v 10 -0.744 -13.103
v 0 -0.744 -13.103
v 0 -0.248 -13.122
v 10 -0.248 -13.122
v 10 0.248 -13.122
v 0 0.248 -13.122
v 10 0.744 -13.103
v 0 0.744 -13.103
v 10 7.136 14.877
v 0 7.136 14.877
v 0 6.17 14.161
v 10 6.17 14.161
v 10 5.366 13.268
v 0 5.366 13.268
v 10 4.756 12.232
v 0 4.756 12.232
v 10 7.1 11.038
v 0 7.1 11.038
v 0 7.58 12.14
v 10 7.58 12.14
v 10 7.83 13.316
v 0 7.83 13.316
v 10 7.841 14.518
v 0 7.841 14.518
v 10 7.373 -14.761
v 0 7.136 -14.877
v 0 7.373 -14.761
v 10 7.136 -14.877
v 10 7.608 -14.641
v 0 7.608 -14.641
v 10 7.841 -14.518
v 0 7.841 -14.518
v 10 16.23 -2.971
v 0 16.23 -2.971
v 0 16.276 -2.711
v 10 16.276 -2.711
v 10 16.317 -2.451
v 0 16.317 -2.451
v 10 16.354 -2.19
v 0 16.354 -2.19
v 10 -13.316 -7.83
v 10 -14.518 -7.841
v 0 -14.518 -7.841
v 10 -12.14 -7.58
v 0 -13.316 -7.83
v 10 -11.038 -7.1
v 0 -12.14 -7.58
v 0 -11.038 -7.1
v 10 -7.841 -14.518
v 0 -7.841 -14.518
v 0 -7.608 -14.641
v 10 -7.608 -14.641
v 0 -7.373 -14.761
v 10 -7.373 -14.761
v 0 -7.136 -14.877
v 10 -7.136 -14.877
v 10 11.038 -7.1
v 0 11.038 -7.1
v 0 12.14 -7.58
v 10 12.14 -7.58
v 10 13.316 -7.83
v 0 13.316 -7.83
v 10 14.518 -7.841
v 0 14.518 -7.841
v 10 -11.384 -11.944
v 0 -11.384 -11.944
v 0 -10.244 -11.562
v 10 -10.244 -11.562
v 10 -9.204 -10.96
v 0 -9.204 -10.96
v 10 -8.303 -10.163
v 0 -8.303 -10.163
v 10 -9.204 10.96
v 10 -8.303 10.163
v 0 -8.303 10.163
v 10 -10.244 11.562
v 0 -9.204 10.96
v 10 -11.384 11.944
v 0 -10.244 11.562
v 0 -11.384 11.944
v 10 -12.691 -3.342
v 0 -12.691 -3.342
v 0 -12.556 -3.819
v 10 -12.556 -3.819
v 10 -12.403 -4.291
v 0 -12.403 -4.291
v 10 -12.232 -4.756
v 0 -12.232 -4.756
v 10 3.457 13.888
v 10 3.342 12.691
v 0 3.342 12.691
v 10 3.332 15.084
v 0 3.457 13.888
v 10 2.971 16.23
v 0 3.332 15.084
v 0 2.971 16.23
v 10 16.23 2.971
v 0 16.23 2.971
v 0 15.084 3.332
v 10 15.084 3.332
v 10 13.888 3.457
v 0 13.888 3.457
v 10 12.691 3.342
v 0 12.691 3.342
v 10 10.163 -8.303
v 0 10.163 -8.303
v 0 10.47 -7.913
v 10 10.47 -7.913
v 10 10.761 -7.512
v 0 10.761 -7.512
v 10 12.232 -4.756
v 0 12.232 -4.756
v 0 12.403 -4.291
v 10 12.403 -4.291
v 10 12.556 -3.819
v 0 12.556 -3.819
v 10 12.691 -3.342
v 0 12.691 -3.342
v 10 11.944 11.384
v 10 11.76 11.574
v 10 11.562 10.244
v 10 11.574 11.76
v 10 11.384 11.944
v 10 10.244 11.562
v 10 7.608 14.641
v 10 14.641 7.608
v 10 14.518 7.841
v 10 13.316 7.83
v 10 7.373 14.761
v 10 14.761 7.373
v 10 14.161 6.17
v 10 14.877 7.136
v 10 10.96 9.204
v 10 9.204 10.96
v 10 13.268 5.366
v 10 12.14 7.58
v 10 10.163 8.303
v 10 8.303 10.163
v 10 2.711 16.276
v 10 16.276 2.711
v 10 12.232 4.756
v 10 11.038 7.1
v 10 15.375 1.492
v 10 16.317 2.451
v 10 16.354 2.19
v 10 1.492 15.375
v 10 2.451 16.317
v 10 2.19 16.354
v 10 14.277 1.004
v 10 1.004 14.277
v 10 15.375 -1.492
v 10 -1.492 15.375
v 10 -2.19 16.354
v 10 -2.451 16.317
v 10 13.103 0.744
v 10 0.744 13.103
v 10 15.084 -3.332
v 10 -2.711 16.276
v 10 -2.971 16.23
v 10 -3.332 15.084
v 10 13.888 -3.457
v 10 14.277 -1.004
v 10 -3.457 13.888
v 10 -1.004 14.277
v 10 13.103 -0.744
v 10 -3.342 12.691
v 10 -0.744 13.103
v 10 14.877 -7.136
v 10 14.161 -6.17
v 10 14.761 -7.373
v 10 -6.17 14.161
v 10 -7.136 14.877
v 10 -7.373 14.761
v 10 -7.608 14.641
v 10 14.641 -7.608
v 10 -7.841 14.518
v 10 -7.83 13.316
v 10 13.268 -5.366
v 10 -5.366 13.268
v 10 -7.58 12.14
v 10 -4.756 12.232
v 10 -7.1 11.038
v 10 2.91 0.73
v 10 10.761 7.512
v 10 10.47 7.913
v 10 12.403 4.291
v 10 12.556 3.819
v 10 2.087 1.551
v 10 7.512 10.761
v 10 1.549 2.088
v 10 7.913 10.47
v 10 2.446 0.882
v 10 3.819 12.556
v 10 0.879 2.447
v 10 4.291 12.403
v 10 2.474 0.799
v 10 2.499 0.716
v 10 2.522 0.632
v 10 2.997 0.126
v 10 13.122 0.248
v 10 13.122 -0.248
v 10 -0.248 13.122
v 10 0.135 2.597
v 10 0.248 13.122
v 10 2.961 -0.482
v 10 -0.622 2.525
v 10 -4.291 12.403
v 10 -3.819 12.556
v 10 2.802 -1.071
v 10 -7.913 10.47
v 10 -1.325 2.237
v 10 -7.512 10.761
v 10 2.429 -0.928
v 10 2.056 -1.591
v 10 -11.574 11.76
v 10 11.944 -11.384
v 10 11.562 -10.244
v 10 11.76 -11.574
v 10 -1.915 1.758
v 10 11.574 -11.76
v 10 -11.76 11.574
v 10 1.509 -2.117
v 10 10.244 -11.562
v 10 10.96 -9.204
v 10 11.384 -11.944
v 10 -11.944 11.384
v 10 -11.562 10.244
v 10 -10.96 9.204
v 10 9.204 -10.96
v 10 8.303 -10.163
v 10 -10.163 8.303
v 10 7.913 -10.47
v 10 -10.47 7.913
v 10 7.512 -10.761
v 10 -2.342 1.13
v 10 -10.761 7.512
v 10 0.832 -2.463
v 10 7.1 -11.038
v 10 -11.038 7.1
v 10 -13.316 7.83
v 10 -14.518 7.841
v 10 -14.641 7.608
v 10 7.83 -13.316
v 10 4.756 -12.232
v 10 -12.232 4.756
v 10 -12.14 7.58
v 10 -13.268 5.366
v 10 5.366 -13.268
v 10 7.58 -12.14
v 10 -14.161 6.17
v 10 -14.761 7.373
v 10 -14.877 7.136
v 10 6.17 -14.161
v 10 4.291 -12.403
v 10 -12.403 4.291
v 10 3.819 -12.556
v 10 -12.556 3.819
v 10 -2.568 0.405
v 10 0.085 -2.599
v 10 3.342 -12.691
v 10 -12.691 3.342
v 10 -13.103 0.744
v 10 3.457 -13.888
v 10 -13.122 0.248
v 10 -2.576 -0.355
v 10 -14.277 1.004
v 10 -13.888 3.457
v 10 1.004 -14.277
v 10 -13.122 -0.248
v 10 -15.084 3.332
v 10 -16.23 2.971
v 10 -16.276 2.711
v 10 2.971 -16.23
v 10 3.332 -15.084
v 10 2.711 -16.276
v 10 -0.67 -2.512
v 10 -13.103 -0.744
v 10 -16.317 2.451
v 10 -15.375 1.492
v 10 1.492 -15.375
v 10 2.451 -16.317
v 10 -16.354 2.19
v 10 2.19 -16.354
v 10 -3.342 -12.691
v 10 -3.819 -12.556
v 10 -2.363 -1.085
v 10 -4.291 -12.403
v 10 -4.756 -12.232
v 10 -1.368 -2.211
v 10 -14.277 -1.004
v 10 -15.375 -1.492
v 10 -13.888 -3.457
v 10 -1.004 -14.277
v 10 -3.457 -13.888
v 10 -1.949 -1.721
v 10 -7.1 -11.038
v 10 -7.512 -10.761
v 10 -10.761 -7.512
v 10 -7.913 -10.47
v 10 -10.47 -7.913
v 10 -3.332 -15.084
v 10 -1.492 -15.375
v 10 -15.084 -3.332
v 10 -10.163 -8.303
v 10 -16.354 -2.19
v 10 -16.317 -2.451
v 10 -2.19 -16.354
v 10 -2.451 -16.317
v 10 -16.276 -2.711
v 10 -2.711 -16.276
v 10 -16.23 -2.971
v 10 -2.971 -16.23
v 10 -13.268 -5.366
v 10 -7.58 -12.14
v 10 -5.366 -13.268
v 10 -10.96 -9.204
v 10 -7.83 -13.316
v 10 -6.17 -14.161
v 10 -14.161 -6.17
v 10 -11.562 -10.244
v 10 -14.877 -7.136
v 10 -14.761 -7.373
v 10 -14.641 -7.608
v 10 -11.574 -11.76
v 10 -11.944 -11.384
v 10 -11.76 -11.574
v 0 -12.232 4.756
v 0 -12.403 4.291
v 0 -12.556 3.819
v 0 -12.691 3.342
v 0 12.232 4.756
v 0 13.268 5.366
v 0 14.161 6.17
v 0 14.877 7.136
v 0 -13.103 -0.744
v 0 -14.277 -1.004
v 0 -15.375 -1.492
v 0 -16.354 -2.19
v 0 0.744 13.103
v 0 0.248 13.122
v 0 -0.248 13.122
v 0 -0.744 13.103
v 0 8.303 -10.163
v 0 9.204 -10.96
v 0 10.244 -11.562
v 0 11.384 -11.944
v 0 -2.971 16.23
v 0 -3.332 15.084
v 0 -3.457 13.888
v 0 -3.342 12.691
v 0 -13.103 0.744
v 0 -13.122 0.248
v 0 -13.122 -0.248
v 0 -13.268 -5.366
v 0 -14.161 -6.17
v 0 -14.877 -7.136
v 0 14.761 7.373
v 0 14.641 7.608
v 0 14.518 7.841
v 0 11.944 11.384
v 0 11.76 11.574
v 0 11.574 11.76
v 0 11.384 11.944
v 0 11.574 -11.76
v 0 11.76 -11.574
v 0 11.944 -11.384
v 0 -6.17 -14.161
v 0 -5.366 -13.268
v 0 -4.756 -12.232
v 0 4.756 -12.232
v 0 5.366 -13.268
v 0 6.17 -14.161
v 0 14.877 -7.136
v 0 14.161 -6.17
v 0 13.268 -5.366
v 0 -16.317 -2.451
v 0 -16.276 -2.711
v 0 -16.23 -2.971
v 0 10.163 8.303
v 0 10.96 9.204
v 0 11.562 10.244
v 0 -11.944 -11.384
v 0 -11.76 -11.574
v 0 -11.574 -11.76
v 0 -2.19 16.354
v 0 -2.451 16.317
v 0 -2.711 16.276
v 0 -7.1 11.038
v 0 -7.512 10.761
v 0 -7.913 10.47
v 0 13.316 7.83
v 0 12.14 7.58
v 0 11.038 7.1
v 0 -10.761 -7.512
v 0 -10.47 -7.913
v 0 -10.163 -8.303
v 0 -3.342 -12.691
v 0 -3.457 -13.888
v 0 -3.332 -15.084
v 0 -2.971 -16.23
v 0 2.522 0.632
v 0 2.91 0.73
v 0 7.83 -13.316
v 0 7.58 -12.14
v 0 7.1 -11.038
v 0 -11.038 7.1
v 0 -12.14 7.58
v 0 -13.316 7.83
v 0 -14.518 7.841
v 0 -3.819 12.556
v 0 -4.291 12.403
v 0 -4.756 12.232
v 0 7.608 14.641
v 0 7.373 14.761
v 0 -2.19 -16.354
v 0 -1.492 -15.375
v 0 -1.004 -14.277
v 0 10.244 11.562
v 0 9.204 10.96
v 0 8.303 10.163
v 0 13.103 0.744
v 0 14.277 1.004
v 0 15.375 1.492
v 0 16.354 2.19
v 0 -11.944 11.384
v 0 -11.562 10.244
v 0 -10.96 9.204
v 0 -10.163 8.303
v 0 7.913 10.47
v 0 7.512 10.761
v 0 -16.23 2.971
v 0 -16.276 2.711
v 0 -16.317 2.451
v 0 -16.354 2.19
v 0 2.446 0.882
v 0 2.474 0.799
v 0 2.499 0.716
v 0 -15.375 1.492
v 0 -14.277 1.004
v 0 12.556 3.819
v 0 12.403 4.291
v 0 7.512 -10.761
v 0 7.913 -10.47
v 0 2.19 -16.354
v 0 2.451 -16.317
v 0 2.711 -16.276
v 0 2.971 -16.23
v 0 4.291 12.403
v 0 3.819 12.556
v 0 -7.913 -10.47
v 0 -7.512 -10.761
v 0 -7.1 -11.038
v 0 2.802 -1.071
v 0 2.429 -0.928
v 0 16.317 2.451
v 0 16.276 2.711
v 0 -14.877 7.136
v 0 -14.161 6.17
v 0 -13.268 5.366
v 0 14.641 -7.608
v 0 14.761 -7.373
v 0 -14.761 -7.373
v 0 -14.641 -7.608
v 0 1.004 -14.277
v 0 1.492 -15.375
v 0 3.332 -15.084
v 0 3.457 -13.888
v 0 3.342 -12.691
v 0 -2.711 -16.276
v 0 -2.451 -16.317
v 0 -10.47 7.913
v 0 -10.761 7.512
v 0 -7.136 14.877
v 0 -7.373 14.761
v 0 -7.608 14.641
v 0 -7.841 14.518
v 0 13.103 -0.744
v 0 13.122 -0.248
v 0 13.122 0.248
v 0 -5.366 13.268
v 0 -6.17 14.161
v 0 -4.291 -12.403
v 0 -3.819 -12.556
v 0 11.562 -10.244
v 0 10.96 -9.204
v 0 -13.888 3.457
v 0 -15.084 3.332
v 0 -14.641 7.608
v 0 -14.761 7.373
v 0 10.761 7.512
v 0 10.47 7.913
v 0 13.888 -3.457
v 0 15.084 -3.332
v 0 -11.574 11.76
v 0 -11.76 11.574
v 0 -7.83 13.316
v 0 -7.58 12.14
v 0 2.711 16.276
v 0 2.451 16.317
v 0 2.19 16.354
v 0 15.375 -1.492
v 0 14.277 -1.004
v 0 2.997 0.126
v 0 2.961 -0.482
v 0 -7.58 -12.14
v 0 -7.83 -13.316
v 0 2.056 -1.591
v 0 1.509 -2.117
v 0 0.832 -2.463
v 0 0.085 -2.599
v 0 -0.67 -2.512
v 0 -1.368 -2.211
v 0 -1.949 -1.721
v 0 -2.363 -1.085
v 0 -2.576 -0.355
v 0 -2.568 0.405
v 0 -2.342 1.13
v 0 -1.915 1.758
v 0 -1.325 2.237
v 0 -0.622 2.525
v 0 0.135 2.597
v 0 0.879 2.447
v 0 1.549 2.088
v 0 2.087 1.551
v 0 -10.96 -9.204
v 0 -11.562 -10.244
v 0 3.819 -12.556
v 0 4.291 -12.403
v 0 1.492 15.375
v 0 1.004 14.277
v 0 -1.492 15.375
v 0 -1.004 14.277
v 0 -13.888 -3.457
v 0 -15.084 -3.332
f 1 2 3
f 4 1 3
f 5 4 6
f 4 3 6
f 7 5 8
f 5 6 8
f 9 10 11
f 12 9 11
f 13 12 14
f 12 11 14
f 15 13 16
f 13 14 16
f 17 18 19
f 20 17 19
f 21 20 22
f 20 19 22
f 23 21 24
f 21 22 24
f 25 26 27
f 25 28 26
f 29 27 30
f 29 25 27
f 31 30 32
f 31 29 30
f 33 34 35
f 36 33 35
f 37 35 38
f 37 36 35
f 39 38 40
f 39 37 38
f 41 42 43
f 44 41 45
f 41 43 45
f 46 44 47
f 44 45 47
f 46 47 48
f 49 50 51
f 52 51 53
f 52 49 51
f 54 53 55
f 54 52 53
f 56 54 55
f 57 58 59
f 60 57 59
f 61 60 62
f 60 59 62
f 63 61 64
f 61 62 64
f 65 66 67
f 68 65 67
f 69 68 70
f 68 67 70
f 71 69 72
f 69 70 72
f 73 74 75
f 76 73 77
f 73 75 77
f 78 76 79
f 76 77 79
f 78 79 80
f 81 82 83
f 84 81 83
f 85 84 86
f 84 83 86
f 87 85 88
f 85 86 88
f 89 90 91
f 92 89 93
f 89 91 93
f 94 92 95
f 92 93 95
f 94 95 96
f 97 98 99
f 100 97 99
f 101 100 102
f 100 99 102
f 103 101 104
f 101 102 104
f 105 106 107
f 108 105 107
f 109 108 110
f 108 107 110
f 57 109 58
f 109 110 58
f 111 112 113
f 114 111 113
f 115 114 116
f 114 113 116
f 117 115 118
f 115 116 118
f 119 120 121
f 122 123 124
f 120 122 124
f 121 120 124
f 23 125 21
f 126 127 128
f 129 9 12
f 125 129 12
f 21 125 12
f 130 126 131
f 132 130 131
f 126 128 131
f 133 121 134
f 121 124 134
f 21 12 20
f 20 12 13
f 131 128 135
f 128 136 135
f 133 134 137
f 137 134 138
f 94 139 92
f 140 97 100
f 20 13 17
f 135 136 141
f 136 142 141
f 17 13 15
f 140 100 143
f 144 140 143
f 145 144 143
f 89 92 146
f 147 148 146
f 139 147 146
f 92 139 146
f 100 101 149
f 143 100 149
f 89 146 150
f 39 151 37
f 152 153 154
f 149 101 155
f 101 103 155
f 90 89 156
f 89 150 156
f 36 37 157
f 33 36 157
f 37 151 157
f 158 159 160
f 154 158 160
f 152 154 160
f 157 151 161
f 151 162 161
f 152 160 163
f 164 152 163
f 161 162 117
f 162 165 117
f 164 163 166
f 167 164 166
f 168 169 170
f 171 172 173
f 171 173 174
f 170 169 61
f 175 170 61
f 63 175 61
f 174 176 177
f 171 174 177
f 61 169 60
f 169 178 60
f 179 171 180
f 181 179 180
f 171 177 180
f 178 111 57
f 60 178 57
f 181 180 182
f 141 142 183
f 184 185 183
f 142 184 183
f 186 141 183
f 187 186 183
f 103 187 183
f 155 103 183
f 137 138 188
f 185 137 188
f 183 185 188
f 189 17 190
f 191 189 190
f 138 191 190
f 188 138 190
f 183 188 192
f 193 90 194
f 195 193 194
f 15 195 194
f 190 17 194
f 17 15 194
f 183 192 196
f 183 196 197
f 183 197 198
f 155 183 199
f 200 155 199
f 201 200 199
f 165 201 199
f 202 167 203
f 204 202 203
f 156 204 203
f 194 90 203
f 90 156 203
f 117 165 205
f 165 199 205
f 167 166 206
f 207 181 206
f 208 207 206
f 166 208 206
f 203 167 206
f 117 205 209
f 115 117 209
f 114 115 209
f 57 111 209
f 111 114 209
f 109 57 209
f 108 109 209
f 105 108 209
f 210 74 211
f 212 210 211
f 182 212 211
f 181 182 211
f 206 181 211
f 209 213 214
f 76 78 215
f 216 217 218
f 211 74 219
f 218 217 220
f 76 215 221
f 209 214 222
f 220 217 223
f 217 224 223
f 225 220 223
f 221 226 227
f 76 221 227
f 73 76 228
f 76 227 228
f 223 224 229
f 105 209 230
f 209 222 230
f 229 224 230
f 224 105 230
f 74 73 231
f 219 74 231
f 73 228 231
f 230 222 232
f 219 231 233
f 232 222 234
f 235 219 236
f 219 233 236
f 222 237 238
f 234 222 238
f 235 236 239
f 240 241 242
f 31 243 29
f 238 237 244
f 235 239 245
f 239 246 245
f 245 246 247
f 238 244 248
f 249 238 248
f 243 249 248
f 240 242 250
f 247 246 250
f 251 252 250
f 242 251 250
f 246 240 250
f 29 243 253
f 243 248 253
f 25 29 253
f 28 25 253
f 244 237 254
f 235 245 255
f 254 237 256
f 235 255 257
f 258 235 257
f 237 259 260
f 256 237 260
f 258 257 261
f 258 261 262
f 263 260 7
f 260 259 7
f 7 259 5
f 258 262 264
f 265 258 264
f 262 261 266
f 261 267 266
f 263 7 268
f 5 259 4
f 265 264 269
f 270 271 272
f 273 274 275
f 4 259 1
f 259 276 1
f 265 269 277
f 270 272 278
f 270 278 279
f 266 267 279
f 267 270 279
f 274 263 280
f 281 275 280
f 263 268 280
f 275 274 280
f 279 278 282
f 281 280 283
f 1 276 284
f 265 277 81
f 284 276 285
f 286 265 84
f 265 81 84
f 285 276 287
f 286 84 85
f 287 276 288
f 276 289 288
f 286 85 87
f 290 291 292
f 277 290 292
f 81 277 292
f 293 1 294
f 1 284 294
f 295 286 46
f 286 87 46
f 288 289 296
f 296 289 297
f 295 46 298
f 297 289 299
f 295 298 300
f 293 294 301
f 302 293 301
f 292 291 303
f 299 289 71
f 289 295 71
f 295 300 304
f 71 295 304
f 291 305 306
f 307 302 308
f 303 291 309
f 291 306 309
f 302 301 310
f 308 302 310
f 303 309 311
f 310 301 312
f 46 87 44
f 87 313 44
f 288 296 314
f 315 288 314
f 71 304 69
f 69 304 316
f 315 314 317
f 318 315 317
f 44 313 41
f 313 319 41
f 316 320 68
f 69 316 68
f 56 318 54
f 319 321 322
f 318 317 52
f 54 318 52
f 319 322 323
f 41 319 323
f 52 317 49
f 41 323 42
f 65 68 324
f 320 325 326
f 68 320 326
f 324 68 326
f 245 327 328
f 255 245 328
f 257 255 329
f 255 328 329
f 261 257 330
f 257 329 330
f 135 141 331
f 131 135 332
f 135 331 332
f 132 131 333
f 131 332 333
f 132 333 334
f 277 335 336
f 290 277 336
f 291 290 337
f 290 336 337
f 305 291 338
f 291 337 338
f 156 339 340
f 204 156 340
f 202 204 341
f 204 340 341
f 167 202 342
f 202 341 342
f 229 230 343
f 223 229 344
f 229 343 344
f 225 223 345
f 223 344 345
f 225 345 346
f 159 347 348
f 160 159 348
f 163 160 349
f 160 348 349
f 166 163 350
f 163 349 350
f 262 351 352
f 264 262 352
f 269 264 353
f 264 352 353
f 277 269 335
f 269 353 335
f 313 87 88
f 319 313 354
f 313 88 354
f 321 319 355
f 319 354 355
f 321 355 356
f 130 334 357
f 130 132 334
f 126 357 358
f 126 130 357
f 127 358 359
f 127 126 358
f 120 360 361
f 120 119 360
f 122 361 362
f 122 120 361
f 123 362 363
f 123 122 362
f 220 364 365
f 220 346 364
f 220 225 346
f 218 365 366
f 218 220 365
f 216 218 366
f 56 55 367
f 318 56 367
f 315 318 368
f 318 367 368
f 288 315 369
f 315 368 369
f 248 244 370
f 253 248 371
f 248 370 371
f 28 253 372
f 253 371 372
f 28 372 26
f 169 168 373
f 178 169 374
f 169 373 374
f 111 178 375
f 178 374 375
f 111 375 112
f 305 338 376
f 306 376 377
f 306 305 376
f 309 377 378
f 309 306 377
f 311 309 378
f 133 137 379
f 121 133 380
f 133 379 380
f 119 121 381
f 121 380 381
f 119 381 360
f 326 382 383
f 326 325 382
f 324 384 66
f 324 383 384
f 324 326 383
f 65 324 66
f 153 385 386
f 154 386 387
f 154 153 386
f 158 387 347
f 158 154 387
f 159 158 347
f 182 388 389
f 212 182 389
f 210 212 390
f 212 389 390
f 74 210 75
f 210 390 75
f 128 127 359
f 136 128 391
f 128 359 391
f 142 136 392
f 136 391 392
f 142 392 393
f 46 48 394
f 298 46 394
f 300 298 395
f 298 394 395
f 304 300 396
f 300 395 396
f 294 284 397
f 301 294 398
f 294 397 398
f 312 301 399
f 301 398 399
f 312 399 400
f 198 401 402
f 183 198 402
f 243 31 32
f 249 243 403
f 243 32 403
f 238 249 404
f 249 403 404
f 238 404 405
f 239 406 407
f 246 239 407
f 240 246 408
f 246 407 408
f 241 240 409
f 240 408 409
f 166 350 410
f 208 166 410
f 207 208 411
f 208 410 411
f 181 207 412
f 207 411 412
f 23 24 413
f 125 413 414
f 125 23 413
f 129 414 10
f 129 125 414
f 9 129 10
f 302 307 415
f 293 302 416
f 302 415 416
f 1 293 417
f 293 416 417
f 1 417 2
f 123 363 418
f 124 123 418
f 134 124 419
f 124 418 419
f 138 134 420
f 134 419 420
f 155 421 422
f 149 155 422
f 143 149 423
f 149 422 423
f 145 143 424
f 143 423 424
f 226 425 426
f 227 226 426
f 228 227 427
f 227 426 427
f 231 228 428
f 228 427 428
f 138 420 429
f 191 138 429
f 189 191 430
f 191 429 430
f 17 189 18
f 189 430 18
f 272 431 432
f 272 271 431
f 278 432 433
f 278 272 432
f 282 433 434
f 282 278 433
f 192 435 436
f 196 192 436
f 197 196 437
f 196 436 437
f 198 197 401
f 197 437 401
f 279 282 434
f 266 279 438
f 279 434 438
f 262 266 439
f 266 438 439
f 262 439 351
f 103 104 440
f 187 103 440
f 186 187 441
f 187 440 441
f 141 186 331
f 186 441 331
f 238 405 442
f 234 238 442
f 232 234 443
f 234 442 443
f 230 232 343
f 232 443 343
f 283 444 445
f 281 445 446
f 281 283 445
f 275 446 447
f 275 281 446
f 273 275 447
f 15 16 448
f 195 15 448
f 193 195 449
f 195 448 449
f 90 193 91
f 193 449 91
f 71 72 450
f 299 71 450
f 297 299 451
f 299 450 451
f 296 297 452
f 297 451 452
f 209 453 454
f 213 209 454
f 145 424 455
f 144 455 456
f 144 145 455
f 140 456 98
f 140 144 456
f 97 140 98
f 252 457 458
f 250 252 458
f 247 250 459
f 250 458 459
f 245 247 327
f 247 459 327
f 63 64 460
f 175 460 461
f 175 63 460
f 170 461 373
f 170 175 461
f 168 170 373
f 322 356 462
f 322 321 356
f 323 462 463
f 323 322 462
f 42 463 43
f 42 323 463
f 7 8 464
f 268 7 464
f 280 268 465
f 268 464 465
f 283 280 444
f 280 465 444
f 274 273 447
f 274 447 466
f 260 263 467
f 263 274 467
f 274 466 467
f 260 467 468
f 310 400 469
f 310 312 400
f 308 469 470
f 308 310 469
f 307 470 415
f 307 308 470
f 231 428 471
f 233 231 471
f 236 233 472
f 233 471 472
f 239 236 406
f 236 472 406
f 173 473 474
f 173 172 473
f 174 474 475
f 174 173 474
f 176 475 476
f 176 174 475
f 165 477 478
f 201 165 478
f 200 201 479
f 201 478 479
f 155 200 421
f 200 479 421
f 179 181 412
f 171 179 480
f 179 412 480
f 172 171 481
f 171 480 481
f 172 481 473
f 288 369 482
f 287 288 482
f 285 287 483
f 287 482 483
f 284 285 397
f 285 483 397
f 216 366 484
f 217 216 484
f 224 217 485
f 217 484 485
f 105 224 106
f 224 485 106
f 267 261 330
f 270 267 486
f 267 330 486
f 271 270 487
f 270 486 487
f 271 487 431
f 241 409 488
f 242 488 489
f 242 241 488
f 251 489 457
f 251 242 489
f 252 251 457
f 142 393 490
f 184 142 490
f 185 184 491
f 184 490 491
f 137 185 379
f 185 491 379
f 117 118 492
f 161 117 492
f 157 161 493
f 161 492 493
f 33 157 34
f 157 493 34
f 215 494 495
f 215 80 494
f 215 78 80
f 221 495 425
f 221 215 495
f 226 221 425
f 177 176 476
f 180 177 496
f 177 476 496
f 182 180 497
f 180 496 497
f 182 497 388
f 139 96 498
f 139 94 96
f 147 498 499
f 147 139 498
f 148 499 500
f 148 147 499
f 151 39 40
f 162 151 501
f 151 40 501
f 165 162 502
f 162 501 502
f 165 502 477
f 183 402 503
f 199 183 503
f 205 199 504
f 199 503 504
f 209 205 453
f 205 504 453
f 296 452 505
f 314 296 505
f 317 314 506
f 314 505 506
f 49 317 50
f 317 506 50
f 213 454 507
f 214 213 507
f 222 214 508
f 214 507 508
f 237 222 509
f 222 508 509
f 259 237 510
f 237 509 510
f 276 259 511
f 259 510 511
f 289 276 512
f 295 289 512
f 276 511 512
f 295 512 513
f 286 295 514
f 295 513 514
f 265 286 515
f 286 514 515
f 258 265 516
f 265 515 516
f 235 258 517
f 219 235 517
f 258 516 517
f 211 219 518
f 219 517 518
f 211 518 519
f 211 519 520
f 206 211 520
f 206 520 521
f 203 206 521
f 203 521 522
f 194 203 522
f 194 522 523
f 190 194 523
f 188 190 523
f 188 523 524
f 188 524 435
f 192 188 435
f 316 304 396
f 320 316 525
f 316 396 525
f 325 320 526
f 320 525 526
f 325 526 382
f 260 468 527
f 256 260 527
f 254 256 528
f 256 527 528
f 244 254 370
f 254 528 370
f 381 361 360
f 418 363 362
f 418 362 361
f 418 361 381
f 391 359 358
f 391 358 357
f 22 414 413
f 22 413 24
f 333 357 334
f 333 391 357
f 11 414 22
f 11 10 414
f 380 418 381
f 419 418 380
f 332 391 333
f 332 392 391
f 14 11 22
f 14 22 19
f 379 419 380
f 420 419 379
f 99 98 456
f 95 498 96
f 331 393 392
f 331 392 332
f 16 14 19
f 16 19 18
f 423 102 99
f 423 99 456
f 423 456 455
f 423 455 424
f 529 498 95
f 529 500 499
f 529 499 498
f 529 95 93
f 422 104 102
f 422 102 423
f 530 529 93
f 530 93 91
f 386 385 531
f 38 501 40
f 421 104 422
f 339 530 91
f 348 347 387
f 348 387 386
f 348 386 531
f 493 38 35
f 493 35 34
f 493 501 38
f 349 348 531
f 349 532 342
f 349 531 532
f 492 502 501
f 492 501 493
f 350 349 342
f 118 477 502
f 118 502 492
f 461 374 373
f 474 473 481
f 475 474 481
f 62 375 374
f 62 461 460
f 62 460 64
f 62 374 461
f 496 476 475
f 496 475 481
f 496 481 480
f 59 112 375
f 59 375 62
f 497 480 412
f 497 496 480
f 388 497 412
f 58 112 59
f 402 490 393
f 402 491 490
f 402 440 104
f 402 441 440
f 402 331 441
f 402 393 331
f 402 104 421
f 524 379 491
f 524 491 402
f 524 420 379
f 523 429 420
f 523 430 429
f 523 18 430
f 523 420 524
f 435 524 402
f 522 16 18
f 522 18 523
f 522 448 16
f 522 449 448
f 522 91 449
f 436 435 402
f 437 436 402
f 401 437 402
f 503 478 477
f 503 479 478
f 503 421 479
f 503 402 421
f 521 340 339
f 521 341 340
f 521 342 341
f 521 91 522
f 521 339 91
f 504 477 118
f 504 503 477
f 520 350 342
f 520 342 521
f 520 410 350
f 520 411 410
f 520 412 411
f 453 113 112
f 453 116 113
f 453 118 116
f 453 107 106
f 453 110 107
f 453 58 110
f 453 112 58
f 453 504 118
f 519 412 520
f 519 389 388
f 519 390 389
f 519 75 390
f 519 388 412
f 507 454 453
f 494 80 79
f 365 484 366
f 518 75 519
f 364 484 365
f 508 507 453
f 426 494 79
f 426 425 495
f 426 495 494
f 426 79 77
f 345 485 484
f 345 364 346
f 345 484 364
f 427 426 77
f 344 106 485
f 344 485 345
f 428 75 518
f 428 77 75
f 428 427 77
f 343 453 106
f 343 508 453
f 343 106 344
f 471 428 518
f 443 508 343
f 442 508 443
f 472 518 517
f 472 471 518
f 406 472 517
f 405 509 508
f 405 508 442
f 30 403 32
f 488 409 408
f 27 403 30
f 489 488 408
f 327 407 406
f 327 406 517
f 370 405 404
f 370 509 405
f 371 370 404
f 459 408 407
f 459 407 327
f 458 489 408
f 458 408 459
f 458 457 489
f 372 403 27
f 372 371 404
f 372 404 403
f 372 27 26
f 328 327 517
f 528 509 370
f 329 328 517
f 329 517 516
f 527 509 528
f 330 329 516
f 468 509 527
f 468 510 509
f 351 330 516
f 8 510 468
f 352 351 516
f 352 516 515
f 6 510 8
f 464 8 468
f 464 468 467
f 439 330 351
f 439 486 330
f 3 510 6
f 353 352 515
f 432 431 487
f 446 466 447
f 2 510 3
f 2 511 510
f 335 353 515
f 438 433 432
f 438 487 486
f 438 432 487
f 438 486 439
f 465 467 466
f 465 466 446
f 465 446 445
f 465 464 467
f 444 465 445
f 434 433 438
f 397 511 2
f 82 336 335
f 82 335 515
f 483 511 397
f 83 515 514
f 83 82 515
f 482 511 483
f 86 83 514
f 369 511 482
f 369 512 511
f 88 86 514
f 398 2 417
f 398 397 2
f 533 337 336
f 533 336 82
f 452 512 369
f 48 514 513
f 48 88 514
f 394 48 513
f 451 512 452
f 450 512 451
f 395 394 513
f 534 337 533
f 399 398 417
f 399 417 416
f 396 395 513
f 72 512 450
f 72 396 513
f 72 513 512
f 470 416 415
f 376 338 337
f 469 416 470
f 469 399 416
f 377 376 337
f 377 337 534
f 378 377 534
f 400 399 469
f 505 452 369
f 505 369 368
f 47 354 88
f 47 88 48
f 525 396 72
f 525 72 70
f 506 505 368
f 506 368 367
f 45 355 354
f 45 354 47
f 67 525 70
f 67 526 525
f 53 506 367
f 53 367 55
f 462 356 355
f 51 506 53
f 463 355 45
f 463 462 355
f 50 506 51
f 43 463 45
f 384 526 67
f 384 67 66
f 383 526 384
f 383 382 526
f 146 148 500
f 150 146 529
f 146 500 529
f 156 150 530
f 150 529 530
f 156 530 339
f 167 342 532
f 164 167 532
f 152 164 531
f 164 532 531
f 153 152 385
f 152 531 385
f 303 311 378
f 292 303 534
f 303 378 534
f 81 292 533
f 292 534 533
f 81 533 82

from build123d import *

# Parameters (mm, degrees)
BASPROSKE_W        = 10
BASPROSKE_H        = 16.5
TOOTHCUT_DEPTH     = 26.38700455
TEETHCUTS_COUNT    = 20
TEETHCUTS_ANGLE    = 342
BORSKE_R           = 2.5
BORE_DEPTH         = 50.0000508
CUT_EXTRUDE1_DEPTH = 26.197414545


with BuildPart() as part:
    # BasProSke → Base-Revolve (revolve)
    with BuildSketch(Plane(origin=(0, 0, 0), x_dir=(1, 0, 0), z_dir=(0, 1, 0)), mode=Mode.PRIVATE) as base_revolve_sk:
        with Locations((5, 8.25)):
            Rectangle(BASPROSKE_W, BASPROSKE_H)
    revolve(base_revolve_sk.sketch.rotate(Axis((-10, 0, 0), (1, 0, 0)), 180), axis=Axis((-10, 0, 0), (1, 0, 0)))

    # TooCutSke → ToothCut (cut, through all)
    with BuildSketch(Plane(origin=(0, 0, 0), x_dir=(0, 0, -1), z_dir=(1, 0, 0))):
        with BuildLine():
            ThreePointArc((0.74381438, 13.102904875), (0, 13.124), (-0.74381438, 13.102904875))
            ThreePointArc((-0.74381438, 13.102904875), (-1.226473103, 14.852072512), (-2.209965745, 16.376962373))
            ThreePointArc((-2.209965745, 16.376962373), (0, 16.5254), (2.209965745, 16.376962373))
            ThreePointArc((2.209965745, 16.376962373), (1.226473103, 14.852072512), (0.74381438, 13.102904875))
        make_face()
    toothcut = extrude(amount=TOOTHCUT_DEPTH, mode=Mode.SUBTRACT)

    # TeethCuts: ToothCut ×20 about axis
    teethcuts_axis = Axis((-10, 0, 0), (1, 0, 0))
    for i in range(1, TEETHCUTS_COUNT):
        add(toothcut.rotate(teethcuts_axis, i * TEETHCUTS_ANGLE / (TEETHCUTS_COUNT - 1)), mode=Mode.SUBTRACT)

    # BorSke → Bore (cut, symmetric)
    with BuildSketch(Plane(origin=(0, 0, 0), x_dir=(0, 0, -1), z_dir=(1, 0, 0))):
        with Locations(Location((0, 0, 0), (0, 0, 180))):
            Circle(BORSKE_R)
    extrude(amount=BORE_DEPTH, both=True, mode=Mode.SUBTRACT)

    # Sketch1 → Cut-Extrude1 (cut, through all)
    with BuildSketch(Plane.ZY):
        with BuildLine():
            Line((-1.07128416, 2.802204534), (-0.928446272, 2.428577263))
            ThreePointArc((-0.928446272, 2.428577263), (0.024935516, -2.599880424), (0.881694674, 2.445938368))
            ThreePointArc((0.881694674, 2.445938368), (0.758017697, 2.487048285), (0.63243603, 2.521908933))
            Line((0.63243603, 2.521908933), (0.729733881, 2.909894923))
            ThreePointArc((0.729733881, 2.909894923), (-0.179062708, 2.994651323), (-1.07128416, 2.802204534))
        make_face()
    extrude(amount=-CUT_EXTRUDE1_DEPTH, mode=Mode.SUBTRACT)


solid = part.part
